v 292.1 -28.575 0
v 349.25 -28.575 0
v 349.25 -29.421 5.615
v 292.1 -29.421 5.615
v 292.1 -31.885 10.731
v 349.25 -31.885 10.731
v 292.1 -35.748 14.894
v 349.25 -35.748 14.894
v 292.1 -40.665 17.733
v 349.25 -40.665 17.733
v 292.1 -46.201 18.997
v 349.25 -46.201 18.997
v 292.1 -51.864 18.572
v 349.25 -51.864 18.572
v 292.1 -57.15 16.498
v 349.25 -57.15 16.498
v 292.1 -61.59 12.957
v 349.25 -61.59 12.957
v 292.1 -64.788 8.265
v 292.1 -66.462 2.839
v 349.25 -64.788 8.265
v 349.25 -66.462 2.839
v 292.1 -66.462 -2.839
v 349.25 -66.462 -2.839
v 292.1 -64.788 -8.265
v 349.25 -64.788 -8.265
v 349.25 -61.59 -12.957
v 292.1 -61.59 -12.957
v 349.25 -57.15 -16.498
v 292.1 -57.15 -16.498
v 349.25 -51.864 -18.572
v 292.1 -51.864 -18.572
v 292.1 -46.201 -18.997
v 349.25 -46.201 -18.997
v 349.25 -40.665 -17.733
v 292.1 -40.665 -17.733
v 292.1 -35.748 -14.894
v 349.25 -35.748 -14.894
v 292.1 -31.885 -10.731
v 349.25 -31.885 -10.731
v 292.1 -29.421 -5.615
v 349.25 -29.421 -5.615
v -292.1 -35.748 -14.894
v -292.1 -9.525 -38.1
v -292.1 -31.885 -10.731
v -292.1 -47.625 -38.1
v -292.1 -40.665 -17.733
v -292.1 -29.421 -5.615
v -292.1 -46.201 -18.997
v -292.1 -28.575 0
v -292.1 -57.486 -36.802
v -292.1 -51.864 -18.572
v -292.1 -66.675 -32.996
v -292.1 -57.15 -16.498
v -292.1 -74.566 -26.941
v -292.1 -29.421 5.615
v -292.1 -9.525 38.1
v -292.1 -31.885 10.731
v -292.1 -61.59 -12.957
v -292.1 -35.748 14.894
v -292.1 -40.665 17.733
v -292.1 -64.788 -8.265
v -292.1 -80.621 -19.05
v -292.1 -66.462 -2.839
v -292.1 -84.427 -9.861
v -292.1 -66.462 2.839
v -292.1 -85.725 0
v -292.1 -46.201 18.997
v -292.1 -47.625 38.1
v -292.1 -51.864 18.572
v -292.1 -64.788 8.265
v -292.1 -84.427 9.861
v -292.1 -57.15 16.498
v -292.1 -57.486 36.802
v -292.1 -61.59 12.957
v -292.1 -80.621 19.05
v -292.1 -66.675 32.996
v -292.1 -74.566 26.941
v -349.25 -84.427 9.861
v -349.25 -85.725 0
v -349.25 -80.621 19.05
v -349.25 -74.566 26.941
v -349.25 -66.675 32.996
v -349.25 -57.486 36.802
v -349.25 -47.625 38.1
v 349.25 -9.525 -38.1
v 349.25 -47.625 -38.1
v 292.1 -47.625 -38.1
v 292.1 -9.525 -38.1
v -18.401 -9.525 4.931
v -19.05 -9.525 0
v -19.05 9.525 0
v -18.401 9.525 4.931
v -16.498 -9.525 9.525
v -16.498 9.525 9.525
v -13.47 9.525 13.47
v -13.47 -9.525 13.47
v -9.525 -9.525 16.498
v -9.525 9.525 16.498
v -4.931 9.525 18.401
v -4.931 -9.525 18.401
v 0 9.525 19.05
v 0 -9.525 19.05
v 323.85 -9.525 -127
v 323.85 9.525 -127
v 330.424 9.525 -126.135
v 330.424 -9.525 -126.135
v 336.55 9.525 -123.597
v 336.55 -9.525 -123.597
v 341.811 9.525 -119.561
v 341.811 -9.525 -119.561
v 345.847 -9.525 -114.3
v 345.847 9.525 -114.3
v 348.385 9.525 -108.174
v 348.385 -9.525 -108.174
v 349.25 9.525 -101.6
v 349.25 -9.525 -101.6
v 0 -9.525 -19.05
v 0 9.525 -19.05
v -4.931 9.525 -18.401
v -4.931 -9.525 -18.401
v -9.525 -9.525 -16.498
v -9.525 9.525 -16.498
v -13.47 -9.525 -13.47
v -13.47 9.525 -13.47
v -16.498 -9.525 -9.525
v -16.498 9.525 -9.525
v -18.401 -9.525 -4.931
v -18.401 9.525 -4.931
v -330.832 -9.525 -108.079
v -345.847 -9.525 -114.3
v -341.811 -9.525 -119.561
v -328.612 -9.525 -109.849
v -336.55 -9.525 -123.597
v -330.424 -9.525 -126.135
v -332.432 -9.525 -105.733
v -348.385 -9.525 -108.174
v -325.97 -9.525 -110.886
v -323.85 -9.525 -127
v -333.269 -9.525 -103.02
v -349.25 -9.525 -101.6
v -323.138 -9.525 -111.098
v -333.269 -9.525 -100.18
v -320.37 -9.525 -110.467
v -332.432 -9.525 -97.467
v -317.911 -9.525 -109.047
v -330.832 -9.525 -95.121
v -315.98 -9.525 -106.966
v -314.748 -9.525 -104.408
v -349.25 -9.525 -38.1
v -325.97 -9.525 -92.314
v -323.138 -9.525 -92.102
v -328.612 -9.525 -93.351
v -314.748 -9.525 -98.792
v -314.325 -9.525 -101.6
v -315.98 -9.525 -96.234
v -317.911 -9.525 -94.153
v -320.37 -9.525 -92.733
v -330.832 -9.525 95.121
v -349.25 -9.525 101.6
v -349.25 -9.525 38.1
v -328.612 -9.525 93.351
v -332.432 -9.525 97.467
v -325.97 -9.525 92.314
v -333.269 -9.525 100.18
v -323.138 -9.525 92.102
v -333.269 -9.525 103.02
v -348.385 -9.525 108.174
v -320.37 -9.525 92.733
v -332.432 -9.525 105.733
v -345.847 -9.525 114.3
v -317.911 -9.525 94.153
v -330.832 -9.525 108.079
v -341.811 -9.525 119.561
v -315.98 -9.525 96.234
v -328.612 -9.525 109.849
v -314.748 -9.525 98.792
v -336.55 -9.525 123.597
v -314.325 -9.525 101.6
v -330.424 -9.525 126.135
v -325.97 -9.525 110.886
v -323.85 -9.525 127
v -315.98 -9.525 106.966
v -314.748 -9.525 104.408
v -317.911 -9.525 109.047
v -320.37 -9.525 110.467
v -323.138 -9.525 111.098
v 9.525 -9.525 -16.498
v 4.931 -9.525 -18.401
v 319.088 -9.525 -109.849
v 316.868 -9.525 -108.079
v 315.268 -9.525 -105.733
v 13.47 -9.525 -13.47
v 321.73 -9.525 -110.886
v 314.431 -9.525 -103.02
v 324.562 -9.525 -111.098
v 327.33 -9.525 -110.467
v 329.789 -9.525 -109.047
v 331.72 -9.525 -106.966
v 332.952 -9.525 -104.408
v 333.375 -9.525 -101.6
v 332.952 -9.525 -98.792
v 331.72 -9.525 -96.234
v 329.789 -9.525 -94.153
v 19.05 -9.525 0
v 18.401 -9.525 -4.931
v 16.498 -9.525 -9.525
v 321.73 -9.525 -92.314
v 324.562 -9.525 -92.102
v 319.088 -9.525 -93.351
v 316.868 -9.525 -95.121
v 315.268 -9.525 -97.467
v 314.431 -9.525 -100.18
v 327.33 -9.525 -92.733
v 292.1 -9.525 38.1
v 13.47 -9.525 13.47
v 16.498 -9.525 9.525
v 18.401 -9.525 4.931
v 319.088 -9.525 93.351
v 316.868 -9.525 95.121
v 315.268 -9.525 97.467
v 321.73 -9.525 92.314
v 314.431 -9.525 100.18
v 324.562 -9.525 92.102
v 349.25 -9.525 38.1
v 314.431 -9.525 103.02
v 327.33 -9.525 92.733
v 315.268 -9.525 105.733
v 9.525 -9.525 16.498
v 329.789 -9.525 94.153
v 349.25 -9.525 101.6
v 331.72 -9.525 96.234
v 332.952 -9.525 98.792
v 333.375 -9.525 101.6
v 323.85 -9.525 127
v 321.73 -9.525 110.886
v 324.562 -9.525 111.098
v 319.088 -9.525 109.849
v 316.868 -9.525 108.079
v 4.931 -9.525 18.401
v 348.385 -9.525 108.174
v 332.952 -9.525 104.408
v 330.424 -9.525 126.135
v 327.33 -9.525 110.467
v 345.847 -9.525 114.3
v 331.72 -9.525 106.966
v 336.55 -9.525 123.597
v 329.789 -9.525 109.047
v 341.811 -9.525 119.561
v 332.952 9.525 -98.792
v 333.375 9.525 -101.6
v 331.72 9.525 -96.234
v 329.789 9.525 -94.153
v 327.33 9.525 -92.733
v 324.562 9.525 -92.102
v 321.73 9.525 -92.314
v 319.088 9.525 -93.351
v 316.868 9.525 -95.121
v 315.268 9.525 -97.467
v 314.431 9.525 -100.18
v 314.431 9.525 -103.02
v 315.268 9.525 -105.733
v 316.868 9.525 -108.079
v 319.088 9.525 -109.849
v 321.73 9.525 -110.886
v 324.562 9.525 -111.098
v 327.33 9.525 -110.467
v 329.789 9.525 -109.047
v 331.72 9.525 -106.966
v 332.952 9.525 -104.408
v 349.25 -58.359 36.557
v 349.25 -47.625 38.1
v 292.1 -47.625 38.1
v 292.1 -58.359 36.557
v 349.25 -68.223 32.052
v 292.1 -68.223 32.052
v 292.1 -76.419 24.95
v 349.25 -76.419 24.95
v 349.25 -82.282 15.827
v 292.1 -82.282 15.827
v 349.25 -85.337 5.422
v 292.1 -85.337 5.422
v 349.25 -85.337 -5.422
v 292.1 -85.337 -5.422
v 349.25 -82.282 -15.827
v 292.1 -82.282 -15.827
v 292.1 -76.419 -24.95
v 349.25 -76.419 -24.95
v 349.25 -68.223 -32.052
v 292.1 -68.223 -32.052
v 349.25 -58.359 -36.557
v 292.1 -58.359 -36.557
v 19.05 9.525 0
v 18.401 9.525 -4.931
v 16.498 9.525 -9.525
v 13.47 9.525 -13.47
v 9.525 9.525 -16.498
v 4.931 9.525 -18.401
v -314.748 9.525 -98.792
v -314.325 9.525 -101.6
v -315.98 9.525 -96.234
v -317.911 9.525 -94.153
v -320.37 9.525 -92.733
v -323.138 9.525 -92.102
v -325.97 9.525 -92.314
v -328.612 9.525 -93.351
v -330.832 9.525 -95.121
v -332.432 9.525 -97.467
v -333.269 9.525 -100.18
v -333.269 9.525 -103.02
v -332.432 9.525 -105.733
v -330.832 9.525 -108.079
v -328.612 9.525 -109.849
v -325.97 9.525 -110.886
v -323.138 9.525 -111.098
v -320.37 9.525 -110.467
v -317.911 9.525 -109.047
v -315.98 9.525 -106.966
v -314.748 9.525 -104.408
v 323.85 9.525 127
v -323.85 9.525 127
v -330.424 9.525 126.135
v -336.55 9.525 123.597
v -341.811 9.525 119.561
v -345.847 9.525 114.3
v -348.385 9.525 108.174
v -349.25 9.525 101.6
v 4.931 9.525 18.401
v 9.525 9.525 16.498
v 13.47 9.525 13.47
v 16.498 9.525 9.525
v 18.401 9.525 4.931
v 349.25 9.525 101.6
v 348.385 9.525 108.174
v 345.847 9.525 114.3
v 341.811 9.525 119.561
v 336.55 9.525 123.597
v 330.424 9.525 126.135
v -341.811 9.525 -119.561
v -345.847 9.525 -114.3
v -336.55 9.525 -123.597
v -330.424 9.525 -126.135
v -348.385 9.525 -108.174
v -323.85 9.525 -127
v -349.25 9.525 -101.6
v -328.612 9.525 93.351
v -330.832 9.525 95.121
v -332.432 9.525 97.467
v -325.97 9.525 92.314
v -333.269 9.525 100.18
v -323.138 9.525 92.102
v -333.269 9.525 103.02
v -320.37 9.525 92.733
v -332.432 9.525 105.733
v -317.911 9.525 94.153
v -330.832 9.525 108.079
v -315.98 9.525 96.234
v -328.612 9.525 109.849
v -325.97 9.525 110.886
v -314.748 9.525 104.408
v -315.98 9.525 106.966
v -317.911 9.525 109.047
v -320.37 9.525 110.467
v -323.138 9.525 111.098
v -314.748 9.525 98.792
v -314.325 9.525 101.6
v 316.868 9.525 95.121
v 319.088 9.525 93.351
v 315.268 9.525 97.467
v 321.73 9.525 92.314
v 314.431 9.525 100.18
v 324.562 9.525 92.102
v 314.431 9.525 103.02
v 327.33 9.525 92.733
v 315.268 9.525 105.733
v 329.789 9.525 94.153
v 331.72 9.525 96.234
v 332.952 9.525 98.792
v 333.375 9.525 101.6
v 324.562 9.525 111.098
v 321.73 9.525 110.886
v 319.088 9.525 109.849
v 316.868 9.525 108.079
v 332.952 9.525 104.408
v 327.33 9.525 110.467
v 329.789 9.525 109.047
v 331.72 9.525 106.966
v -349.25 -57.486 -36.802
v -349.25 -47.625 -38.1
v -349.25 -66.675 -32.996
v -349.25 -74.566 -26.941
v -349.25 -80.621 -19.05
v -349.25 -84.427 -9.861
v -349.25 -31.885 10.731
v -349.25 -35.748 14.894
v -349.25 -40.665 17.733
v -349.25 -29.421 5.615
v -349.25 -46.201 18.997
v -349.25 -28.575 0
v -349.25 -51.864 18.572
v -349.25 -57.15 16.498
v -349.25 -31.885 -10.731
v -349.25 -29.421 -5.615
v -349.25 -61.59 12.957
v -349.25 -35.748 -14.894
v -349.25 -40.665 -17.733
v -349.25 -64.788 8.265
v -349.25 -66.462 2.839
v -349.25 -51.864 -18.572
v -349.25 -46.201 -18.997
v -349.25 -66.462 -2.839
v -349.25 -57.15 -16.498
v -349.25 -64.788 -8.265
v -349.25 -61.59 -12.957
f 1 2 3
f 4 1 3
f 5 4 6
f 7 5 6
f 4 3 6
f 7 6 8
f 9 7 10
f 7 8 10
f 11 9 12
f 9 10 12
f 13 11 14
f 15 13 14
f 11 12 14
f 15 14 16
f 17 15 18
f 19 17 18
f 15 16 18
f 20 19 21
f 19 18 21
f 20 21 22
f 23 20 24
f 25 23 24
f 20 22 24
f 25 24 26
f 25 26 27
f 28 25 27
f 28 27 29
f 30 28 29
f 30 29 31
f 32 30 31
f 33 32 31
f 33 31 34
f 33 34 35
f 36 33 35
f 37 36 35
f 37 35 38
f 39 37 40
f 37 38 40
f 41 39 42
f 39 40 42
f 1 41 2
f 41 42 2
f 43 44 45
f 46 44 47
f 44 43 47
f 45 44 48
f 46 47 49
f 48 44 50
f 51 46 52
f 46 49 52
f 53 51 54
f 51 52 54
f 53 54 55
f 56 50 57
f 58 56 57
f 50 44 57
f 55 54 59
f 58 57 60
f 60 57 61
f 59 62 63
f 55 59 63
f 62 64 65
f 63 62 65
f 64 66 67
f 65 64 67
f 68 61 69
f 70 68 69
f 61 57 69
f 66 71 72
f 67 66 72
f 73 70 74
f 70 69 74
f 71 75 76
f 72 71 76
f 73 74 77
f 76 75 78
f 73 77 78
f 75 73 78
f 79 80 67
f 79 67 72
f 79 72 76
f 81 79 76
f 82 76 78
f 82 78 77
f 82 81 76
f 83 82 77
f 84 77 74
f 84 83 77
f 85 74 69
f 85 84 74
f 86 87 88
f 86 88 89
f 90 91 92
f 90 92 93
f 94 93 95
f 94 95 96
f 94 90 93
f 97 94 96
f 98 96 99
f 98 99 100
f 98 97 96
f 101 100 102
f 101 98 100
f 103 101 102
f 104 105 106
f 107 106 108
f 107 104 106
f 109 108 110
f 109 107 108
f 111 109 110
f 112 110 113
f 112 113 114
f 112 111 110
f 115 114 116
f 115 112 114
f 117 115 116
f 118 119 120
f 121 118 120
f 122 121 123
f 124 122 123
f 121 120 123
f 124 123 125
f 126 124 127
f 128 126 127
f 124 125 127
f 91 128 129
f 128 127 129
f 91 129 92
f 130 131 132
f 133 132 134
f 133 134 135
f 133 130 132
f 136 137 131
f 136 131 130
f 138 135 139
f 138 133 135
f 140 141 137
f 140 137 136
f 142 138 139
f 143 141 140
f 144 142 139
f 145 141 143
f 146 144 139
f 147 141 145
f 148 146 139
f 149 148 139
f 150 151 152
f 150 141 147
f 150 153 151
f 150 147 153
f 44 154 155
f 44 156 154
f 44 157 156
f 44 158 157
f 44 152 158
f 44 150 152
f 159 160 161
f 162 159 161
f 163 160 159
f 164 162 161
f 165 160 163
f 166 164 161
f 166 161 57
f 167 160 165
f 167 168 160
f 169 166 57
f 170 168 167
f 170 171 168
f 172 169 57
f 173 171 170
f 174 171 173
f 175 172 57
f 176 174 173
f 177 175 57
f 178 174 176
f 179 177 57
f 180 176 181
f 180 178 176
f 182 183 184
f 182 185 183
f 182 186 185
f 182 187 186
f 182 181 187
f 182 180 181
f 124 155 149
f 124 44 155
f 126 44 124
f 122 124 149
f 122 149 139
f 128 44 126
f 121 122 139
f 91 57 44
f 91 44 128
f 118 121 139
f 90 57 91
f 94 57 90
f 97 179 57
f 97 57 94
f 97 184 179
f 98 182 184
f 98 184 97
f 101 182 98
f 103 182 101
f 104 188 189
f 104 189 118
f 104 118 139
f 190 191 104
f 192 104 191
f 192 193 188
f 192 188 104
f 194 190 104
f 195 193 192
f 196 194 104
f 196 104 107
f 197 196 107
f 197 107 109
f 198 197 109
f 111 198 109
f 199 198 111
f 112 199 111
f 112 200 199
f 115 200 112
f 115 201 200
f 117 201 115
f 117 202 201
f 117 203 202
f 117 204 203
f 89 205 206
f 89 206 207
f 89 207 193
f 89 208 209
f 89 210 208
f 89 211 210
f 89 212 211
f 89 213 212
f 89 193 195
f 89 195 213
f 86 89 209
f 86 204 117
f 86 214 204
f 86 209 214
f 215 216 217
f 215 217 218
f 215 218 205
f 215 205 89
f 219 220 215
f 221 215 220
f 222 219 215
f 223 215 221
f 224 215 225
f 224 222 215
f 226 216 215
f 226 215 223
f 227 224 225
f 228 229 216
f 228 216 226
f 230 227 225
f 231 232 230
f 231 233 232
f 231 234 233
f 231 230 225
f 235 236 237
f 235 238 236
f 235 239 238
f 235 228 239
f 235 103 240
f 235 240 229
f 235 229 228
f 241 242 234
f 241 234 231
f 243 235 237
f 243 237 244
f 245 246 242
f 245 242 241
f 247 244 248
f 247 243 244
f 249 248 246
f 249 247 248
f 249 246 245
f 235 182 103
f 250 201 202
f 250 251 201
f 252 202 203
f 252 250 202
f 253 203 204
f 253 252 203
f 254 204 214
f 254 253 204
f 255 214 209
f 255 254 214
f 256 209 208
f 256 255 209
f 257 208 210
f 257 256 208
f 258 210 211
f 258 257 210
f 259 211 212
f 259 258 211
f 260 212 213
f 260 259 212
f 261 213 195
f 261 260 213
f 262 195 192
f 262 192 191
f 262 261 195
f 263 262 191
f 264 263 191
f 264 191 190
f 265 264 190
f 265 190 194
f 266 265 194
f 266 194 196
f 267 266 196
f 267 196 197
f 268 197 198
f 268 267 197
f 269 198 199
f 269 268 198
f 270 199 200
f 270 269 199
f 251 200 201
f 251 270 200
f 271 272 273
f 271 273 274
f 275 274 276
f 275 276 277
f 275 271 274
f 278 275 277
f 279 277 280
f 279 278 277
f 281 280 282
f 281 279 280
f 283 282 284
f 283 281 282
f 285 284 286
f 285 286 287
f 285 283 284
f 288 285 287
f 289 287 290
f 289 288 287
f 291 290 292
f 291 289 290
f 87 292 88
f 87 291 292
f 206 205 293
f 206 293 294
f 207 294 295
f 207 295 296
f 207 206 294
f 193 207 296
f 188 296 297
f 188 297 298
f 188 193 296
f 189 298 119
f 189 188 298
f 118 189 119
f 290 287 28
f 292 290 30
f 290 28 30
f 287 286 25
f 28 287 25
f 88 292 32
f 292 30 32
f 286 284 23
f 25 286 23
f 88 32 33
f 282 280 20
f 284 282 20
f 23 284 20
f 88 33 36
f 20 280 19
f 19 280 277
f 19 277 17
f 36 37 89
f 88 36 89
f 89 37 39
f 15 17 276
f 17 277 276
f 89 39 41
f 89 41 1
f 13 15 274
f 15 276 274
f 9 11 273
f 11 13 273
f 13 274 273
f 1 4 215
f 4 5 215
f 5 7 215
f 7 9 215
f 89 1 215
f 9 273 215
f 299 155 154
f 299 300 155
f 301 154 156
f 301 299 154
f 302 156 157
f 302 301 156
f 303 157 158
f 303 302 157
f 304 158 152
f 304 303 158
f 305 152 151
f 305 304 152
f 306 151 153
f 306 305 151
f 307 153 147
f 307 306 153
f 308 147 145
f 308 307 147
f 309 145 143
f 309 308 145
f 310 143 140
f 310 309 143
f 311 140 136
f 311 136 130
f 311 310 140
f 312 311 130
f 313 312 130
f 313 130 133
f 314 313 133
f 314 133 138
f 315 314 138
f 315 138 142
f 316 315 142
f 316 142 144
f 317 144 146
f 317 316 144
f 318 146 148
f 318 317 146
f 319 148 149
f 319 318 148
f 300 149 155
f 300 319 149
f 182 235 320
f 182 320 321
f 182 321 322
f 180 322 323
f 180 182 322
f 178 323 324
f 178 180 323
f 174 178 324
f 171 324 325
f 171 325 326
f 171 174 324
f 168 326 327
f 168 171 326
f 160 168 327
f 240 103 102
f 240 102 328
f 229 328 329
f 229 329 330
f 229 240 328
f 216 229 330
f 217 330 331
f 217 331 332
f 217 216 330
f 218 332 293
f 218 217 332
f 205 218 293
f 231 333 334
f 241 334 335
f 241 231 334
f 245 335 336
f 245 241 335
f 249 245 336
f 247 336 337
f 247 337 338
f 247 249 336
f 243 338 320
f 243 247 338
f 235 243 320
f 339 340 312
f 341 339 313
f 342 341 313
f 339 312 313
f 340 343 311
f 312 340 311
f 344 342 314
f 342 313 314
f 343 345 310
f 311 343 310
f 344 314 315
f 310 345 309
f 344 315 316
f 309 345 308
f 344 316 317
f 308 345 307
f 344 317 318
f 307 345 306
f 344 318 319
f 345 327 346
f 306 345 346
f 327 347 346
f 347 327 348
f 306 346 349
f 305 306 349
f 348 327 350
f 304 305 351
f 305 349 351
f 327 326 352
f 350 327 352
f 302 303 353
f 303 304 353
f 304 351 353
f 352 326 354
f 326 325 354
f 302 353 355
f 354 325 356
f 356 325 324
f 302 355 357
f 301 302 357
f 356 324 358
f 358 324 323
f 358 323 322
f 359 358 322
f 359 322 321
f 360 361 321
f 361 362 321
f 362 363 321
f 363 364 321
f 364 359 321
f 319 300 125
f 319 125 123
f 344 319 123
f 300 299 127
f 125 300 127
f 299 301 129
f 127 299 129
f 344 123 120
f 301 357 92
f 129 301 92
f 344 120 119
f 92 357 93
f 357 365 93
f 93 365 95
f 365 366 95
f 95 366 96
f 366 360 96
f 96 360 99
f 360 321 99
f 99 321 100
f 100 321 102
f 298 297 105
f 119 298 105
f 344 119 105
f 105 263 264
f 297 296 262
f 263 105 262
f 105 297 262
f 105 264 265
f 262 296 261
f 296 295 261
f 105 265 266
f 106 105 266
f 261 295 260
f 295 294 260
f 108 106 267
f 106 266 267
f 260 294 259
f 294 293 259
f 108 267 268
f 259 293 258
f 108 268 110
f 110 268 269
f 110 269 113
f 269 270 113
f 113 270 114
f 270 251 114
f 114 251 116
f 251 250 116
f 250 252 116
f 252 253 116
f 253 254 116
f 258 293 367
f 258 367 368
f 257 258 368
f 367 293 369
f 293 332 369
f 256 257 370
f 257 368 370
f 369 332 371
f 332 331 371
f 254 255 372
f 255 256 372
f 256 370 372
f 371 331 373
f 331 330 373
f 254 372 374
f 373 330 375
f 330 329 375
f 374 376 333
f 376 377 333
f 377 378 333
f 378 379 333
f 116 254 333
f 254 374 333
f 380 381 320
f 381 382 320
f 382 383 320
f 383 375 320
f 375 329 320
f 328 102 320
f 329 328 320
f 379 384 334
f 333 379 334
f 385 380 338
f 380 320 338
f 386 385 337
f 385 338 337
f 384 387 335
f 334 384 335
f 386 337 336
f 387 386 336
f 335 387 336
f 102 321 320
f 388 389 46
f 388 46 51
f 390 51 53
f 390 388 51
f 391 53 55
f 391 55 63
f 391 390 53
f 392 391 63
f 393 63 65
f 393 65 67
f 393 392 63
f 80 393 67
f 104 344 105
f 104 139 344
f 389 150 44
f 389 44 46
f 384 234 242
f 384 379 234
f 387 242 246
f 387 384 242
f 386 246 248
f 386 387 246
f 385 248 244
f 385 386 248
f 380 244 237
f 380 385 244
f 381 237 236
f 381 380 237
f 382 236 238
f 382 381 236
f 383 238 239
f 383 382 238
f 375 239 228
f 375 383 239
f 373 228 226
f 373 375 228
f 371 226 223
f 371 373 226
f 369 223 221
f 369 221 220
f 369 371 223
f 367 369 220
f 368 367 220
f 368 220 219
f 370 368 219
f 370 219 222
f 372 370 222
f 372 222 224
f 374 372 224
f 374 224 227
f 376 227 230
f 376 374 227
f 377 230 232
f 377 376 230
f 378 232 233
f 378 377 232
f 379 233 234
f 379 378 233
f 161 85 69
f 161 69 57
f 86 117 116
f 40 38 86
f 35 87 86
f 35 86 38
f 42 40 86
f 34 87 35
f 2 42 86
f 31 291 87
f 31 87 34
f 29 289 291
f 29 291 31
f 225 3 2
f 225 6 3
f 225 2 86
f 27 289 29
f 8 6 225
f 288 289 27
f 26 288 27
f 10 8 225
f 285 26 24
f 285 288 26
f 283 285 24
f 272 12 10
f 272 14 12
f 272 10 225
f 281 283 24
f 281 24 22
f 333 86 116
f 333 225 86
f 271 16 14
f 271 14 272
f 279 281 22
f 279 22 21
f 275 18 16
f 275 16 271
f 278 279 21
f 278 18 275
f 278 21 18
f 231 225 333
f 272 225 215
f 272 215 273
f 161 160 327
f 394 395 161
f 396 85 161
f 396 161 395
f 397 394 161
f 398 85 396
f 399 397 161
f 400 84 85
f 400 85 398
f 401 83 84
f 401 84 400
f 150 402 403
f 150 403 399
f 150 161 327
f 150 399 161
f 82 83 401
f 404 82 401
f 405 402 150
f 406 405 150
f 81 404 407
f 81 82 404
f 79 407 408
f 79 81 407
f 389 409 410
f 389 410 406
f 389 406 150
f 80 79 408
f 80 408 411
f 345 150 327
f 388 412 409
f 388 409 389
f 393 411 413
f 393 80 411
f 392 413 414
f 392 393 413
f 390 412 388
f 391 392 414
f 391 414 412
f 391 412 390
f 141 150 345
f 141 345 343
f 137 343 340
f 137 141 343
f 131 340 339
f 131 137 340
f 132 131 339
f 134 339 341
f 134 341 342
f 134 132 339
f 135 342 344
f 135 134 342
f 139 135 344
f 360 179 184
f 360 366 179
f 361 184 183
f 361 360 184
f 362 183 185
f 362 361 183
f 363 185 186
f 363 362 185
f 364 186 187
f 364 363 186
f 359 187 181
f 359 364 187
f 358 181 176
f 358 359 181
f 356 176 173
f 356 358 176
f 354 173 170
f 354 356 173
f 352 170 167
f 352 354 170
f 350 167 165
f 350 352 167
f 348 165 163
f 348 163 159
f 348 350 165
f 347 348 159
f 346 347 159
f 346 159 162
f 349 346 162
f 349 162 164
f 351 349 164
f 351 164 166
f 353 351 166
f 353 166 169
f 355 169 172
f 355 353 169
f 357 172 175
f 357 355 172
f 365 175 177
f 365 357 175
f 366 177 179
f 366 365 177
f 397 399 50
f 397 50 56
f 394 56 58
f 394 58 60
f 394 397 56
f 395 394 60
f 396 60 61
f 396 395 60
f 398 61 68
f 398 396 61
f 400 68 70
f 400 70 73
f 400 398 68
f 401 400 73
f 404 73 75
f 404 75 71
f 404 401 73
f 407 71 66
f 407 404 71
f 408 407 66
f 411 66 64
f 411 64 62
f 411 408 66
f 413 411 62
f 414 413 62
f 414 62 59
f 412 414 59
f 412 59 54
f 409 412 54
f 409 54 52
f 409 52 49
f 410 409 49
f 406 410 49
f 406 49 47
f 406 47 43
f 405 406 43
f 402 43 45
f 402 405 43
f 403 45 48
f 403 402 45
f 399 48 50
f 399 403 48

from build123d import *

# Parameters (mm, degrees)
F0_R     = 9.525
F1_DEPTH = 9.525
F3_R     = 19.05
F4_DEPTH = 57.15
F7_DEPTH = 57.15


with BuildPart() as f1:
    # F0 (on Front) → F1 (new body, symmetric)
    with BuildSketch(Plane.XZ):
        with BuildLine():
            Line((19.05, 0), (349.25, 0))
            Line((349.25, 0), (349.25, 101.6))
            ThreePointArc((349.25, 101.6), (341.810512, 119.560512), (323.85, 127))
            Line((323.85, 127), (0, 127))
            Line((0, 127), (0, 19.05))
            ThreePointArc((0, 19.05), (13.470384, 13.470384), (19.05, 0))
        make_face()
        with Locations((323.85, 101.6)):
            Circle(F0_R, mode=Mode.SUBTRACT)
        with BuildLine():
            Line((-349.25, 0), (-19.05, 0))
            ThreePointArc((-19.05, 0), (-13.470384, 13.470384), (0, 19.05))
            Line((0, 19.05), (0, 127))
            Line((0, 127), (-323.85, 127))
            ThreePointArc((-323.85, 127), (-341.810512, 119.560512), (-349.25, 101.6))
            Line((-349.25, 101.6), (-349.25, 0))
        make_face()
        with Locations((-323.85, 101.6)):
            Circle(F0_R, mode=Mode.SUBTRACT)
        with BuildLine():
            Line((-323.85, -127), (0, -127))
            Line((0, -127), (0, -19.05))
            ThreePointArc((0, -19.05), (-13.470384, -13.470384), (-19.05, 0))
            Line((-19.05, 0), (-349.25, 0))
            Line((-349.25, 0), (-349.25, -101.6))
            ThreePointArc((-349.25, -101.6), (-341.810512, -119.560512), (-323.85, -127))
        make_face()
        with Locations((-323.85, -101.6)):
            Circle(F0_R, mode=Mode.SUBTRACT)
        with BuildLine():
            Line((0, -127), (323.85, -127))
            ThreePointArc((323.85, -127), (341.810512, -119.560512), (349.25, -101.6))
            Line((349.25, -101.6), (349.25, 0))
            Line((349.25, 0), (19.05, 0))
            ThreePointArc((19.05, 0), (13.470384, -13.470384), (0, -19.05))
            Line((0, -19.05), (0, -127))
        make_face()
        with Locations((323.85, -101.6)):
            Circle(F0_R, mode=Mode.SUBTRACT)
    extrude(amount=F1_DEPTH, both=True)

    # F3 (on offset) → F4 (join)
    with BuildSketch(Plane.YZ.offset(349.25)):
        with BuildLine():
            Line((-47.625, -38.1), (-9.525, -38.1))
            Line((-9.525, -38.1), (-9.525, 0))
            ThreePointArc((-9.525, 0), (-20.684232, -26.940768), (-47.625, -38.1))
        make_face()
        with BuildLine():
            ThreePointArc((-47.625, 38.1), (-20.684232, 26.940768), (-9.525, 0))
            Line((-9.525, 0), (-9.525, 38.1))
            Line((-9.525, 38.1), (-47.625, 38.1))
        make_face()
        with Locations((-47.625, 0)):
            Circle(F3_R)
        with BuildLine():
            ThreePointArc((-47.625, -38.1), (-20.684232, -26.940768), (-9.525, 0))
            ThreePointArc((-9.525, 0), (-20.684232, 26.940768), (-47.625, 38.1))
            ThreePointArc((-47.625, 38.1), (-85.725, 0), (-47.625, -38.1))
        make_face()
        with Locations((-47.625, 0)):
            Circle(F3_R, mode=Mode.SUBTRACT)
    extrude(amount=-F4_DEPTH)

    # F6 (on offset) → F7 (join)
    with BuildSketch(Plane(origin=(-349.25, 0, 0), x_dir=(0, -1, 0), z_dir=(-1, 0, 0))):
        with BuildLine():
            ThreePointArc((47.625, 38.1), (20.684232, 26.940768), (9.525, 0))
            ThreePointArc((9.525, 0), (20.684232, -26.940768), (47.625, -38.1))
            ThreePointArc((47.625, -38.1), (74.565768, -26.940768), (85.725, 0))
            ThreePointArc((85.725, 0), (74.565768, 26.940768), (47.625, 38.1))
        make_face()
        with BuildLine():
            ThreePointArc((66.675, 0), (47.625, -19.05), (28.575, 0))
            ThreePointArc((28.575, 0), (47.625, 19.05), (66.675, 0))
        make_face(mode=Mode.SUBTRACT)
        with BuildLine():
            Line((9.525, 38.1), (9.525, 0))
            ThreePointArc((9.525, 0), (20.684232, 26.940768), (47.625, 38.1))
            Line((47.625, 38.1), (9.525, 38.1))
        make_face()
        with BuildLine():
            Line((9.525, 0), (9.525, -38.1))
            Line((9.525, -38.1), (47.625, -38.1))
            ThreePointArc((47.625, -38.1), (20.684232, -26.940768), (9.525, 0))
        make_face()
    extrude(amount=-F7_DEPTH)


solid = f1.part
